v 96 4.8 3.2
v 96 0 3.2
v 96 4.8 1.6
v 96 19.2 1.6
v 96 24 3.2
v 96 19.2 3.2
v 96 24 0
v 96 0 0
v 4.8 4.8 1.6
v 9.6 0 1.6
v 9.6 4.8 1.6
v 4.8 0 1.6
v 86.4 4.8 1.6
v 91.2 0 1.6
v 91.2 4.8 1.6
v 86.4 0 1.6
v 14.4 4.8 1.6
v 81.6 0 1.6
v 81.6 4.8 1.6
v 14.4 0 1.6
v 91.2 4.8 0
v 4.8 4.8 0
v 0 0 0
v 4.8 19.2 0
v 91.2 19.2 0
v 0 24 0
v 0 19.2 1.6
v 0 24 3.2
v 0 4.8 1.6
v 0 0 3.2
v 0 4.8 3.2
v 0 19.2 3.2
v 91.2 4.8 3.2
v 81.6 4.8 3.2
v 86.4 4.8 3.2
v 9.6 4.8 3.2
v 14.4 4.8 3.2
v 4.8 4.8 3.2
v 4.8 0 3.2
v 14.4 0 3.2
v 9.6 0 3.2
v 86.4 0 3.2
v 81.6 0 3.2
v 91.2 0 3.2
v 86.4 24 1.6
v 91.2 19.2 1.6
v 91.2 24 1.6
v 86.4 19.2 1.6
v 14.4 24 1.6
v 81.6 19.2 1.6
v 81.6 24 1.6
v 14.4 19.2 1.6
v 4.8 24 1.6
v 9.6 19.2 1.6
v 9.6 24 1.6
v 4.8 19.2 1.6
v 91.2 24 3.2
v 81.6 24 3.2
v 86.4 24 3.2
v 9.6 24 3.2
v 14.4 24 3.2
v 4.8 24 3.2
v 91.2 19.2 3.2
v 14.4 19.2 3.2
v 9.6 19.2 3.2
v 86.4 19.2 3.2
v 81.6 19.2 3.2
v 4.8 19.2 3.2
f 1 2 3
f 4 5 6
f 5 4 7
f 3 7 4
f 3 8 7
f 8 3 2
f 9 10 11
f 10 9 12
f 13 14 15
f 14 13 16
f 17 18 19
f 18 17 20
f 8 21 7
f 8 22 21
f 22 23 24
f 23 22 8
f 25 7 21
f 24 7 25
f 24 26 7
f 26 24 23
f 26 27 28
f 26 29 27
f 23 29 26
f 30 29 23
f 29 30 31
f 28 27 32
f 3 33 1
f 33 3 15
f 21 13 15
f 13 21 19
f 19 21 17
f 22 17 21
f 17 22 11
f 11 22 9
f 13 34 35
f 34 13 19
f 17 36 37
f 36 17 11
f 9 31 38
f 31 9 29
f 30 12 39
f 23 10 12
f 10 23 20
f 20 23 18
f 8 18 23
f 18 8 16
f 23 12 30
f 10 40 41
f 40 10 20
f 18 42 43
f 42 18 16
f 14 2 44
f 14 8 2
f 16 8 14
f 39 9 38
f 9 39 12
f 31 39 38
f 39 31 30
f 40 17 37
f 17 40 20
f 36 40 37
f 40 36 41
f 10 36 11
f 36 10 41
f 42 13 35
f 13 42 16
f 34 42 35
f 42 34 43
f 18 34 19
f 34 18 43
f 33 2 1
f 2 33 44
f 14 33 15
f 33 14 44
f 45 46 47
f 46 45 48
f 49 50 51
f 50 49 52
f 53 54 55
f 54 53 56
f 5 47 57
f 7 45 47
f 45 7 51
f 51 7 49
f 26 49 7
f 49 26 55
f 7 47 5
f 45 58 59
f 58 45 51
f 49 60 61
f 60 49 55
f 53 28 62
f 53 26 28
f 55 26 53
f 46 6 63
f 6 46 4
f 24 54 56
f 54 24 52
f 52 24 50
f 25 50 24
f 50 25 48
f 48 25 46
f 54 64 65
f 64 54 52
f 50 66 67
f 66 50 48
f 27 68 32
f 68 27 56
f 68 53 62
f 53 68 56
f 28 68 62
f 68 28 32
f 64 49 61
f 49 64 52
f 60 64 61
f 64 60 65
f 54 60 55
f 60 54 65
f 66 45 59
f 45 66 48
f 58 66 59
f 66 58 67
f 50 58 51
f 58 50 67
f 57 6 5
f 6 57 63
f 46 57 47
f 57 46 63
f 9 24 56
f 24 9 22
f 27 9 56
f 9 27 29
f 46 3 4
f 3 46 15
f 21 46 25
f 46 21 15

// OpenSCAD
// file: myCylinder.scad
// Copyright Stephen Morrisson 2017
// All rights reserved

// rh Cent Cylinder
// rh Cylinder
use <myCube.scad>

module rhCentCylinder(c, rRadius, z)
{
    color(c) cylinder(h=z, r=rRadius, center=false);
}
translate([-15, -15, 0]) rhCentCylinder("red", 3, 2);

module rhCylinder(c, rRadius, z)
{
    translate([rRadius, rRadius, 0]) rhCentCylinder(c, rRadius, z);
}
translate([-15, 15, 0]) rhCylinder("blue", 2, 3);

module transCylinder(c, xO, yO, zO, rRadius, z)
{
    translate([xO, yO, zO]) rhCylinder(c, rRadius, z);
}
//transCylinder("red", 0,0,0, 4, 1);
transCylinder("green", 15, 15, 0, 2, 2);

module centRightCylinder(c, rRadius, z)
{
    rD = rRadius * 3.0;
    difference()
    {
        rhCentCylinder(c, rRadius, z);
        transCube(c, -rD, -rRadius, -rRadius,  rD, rD, rD);
    }
}
centRightCylinder("green", 2, 2);

module rightHalfCylinder(c, xO, yO, zO, rRadius, z)
{
    translate([xO, yO + rRadius, zO]) centRightCylinder(c, rRadius, z);
}
rightHalfCylinder("yellow", 10, 0, 0, 2, 1);

module leftHalfCylinder(c, xO, yO, zO, rRadius, z)
{
    translate([xO + rRadius, yO + rRadius, zO])
        rotate([0,0,180]) centRightCylinder(c, rRadius, z);
}
leftHalfCylinder("yellow", -10, 0, 0, 2, 1);

module topHalfCylinder(c, xO, yO, zO, rRadius, z)
{
    translate([xO + rRadius, yO, zO])
        rotate([0,0,90]) centRightCylinder(c, rRadius, z);
}
topHalfCylinder("yellow", 0, 10, 0, 2, 1);

module bottomHalfCylinder(c, xO, yO, zO, rRadius, z)
{
    translate([xO + rRadius, yO + rRadius, zO])
        rotate([0,0,270]) centRightCylinder(c, rRadius, z);
}
bottomHalfCylinder("yellow", 0, -10, 0, 2, 1);
// file: myBaseParts.scad
// Copyright Stephen Morrisson 2017
// All rights reserved

// {xyz, trans, rot} UBar


use <myCube.scad>
use <myCylinder.scad>



module xyzUBar(cB, cL, cR, xBase, yBase, zBase, 
    xLeft, zLeft, xRight, zRight)
{
    xyzCube(cB, xBase, yBase, zBase);
    transCube(cL, 0, 0, zBase, xLeft, yBase, zLeft);
    transCube(cR, xBase - xRight, 0, zBase, xRight, yBase, zRight);
}

xyzUBar("red", "green", "blue", 10, 14, 1, 2, 3, 4, 5);

module transUBar(c, xO, yO, zO, xB, yB, zB, xL, zL, xR, zR)
{
    translate([xO, yO, zO]) xyzUBar(c, c, c, xB, yB, zB, xL, zL, xR, zR);
}
//transUBar("orange", -10, -10, -1,  4, 2, 1, 1, 1, 2, 2);


module rotUBar(c, rotX, rotY, rotZ, xO, yO, zO,
    xB, yB, zB, xL, zL, xR, zR)
{
    rotate([rotX, rotY, rotZ]) transUBar(c, xO, yO, zO, xB, yB, zB,
        xL, zL, xR, zR);
}
rotUBar("orange", 90, 180, 270, -10, -10, -1,  4, 2, 1, 1, 1, 2, 2);
// file: Flang.scad
// Copyright Stephen Morrisson 2017
// All rights reserved

// Tab Flang

use <myCube.scad>
use <myCylinder.scad>

module rightSimpleTab(c, rRadius, z, xSpacer)
{
    yD = 2.0 * rRadius;
    xyzCube(c, xSpacer, yD, z);
    rightHalfCylinder(c, xSpacer, 0, 0, rRadius, z);
}

module rightTab(c, xO, yO, zO, rRadius, z, xSpacer)
{
    translate([xO, yO, zO])
    {
        rightSimpleTab(c, rRadius, z, xSpacer);
    }
}
rightTab("blue", 10, 0, 0, 3, 1, 4);

module rightFlang(c, xO, yO, zO, rRadius, z, xSpacer, rHole)
{
    rMid = rRadius - rHole;
    difference()
    {
        rightTab(c, xO, yO, zO, rRadius, z, xSpacer);
        transCylinder(c, xO + xSpacer - rRadius, yO + rMid, zO -1,
            rHole, z + 2.0); 
    }
}
rightFlang("green", 20,0,0, 3, 1, 4, 2);

module leftTab(c, xO, yO, zO, rRadius, z, xSpacer)
{
    mirror([1, 0, 0]) rightTab(c, -xO, yO, zO, rRadius, z, xSpacer);
}
leftTab("blue", -10,0,0, 3, 1, 4);

module leftFlang(c, xO, yO, zO, rRadius, z, xSpacer, rHole)
{
    mirror([1, 0, 0])
        rightFlang(c, -xO, yO, zO, rRadius, z, xSpacer, rHole);
}
leftFlang("green", -20,0,0, 3, 1, 4, 1);
// file: myCube.scad
// Copyright Stephen Morrisson 2017
// All rights reserved

// {xyz, rot, trans, tr} Cube

module xyzCube(c, x, y, z)
{
    color(c) cube([x, y, z], false);
}

module rotCube(c, rotX, rotY, rotZ, x, y, z)
{
    rotate([rotX, rotY, rotZ]) xyzCube(c, x, y, z);
}
translate([-15, 15, 0,])rotCube("green", 45, 45, 45, 2,2,2);

module transCube(c, xOffset, yOffset, zOffset, x, y, z)
{
    translate([xOffset, yOffset, zOffset]) xyzCube(c, x, y, z);
}
transCube("brown", -15, -15, 0, 3, 2, 1);


module trCube(c, rotX, rotY, rotZ, xO, yO, zO, x, y, z)
{
    translate([xO, yO, zO])
    rotate([rotX, rotY, rotZ])
    xyzCube(c, x, y, z);
}
//trCube("yellow", 0,0,0, 0,0,0, 2, 3, 4);
//trCube("green", 45, 45, 45, 4, 3, 1, 5, 6, 7);
//trCube("blue", 0, 0, 45, 20, 0, 0, 5, 6, 7);
trCube("orange", 0,0,0, -10, 0, 0, 1,1,1);
//trCube("orange", 45,0,0, -15, 0, 0, 1,1,1);
//trCube("orange", 0,45,0, -20, 0, 0, 1,1,1);
//trCube("orange", 0,0,45, -25, 0, 0, 1,1,1);
// main file
// Copyright Stephen Morrisson 2017
// All rights reserved

//  Loom Frame

use <myCube.scad>
use <Flang.scad>
use <myBaseParts.scad>



module HalfCrossBrace(c, xBase, yBase, zBase)
{
    xVal = 1;
    xRidge = 1;
    yRidge = 1;
    zRidge = 1;

    yRidge = 1;
    
    xyzCube(c, xBase, yBase, zBase);
    transCube(c, 0, 0, zBase, 1,1,1);
    transCube(c, xRidge + xVal, 0, zBase, 1,1,1);
    
    transCube(c, xBase - (2 * xRidge) - xVal, 0, zBase, 1,1,1);
    transCube(c, xBase - xRidge, 0, zBase, xRidge, yRidge, zRidge);
}

module CrossBrace(c, xBase, yBase, zBase, ySpacer, xSide)
{
    yMax = ySpacer + (2.0 * yBase);
    
    HalfCrossBrace("green", xBase, yBase, zBase);
    translate([0,yBase + ySpacer,0])
        HalfCrossBrace("blue", xBase, yBase, zBase);
    transCube("red", 0, 0, 0, xSide, yMax, zBase);
    transCube(c, xBase - xSide, 0, 0, xSide, yMax, zBase);
}

scale([1.6,1.6,1.6])
scale([3,3,1])
CrossBrace("green", 20, 1, 1, 3, 1);
